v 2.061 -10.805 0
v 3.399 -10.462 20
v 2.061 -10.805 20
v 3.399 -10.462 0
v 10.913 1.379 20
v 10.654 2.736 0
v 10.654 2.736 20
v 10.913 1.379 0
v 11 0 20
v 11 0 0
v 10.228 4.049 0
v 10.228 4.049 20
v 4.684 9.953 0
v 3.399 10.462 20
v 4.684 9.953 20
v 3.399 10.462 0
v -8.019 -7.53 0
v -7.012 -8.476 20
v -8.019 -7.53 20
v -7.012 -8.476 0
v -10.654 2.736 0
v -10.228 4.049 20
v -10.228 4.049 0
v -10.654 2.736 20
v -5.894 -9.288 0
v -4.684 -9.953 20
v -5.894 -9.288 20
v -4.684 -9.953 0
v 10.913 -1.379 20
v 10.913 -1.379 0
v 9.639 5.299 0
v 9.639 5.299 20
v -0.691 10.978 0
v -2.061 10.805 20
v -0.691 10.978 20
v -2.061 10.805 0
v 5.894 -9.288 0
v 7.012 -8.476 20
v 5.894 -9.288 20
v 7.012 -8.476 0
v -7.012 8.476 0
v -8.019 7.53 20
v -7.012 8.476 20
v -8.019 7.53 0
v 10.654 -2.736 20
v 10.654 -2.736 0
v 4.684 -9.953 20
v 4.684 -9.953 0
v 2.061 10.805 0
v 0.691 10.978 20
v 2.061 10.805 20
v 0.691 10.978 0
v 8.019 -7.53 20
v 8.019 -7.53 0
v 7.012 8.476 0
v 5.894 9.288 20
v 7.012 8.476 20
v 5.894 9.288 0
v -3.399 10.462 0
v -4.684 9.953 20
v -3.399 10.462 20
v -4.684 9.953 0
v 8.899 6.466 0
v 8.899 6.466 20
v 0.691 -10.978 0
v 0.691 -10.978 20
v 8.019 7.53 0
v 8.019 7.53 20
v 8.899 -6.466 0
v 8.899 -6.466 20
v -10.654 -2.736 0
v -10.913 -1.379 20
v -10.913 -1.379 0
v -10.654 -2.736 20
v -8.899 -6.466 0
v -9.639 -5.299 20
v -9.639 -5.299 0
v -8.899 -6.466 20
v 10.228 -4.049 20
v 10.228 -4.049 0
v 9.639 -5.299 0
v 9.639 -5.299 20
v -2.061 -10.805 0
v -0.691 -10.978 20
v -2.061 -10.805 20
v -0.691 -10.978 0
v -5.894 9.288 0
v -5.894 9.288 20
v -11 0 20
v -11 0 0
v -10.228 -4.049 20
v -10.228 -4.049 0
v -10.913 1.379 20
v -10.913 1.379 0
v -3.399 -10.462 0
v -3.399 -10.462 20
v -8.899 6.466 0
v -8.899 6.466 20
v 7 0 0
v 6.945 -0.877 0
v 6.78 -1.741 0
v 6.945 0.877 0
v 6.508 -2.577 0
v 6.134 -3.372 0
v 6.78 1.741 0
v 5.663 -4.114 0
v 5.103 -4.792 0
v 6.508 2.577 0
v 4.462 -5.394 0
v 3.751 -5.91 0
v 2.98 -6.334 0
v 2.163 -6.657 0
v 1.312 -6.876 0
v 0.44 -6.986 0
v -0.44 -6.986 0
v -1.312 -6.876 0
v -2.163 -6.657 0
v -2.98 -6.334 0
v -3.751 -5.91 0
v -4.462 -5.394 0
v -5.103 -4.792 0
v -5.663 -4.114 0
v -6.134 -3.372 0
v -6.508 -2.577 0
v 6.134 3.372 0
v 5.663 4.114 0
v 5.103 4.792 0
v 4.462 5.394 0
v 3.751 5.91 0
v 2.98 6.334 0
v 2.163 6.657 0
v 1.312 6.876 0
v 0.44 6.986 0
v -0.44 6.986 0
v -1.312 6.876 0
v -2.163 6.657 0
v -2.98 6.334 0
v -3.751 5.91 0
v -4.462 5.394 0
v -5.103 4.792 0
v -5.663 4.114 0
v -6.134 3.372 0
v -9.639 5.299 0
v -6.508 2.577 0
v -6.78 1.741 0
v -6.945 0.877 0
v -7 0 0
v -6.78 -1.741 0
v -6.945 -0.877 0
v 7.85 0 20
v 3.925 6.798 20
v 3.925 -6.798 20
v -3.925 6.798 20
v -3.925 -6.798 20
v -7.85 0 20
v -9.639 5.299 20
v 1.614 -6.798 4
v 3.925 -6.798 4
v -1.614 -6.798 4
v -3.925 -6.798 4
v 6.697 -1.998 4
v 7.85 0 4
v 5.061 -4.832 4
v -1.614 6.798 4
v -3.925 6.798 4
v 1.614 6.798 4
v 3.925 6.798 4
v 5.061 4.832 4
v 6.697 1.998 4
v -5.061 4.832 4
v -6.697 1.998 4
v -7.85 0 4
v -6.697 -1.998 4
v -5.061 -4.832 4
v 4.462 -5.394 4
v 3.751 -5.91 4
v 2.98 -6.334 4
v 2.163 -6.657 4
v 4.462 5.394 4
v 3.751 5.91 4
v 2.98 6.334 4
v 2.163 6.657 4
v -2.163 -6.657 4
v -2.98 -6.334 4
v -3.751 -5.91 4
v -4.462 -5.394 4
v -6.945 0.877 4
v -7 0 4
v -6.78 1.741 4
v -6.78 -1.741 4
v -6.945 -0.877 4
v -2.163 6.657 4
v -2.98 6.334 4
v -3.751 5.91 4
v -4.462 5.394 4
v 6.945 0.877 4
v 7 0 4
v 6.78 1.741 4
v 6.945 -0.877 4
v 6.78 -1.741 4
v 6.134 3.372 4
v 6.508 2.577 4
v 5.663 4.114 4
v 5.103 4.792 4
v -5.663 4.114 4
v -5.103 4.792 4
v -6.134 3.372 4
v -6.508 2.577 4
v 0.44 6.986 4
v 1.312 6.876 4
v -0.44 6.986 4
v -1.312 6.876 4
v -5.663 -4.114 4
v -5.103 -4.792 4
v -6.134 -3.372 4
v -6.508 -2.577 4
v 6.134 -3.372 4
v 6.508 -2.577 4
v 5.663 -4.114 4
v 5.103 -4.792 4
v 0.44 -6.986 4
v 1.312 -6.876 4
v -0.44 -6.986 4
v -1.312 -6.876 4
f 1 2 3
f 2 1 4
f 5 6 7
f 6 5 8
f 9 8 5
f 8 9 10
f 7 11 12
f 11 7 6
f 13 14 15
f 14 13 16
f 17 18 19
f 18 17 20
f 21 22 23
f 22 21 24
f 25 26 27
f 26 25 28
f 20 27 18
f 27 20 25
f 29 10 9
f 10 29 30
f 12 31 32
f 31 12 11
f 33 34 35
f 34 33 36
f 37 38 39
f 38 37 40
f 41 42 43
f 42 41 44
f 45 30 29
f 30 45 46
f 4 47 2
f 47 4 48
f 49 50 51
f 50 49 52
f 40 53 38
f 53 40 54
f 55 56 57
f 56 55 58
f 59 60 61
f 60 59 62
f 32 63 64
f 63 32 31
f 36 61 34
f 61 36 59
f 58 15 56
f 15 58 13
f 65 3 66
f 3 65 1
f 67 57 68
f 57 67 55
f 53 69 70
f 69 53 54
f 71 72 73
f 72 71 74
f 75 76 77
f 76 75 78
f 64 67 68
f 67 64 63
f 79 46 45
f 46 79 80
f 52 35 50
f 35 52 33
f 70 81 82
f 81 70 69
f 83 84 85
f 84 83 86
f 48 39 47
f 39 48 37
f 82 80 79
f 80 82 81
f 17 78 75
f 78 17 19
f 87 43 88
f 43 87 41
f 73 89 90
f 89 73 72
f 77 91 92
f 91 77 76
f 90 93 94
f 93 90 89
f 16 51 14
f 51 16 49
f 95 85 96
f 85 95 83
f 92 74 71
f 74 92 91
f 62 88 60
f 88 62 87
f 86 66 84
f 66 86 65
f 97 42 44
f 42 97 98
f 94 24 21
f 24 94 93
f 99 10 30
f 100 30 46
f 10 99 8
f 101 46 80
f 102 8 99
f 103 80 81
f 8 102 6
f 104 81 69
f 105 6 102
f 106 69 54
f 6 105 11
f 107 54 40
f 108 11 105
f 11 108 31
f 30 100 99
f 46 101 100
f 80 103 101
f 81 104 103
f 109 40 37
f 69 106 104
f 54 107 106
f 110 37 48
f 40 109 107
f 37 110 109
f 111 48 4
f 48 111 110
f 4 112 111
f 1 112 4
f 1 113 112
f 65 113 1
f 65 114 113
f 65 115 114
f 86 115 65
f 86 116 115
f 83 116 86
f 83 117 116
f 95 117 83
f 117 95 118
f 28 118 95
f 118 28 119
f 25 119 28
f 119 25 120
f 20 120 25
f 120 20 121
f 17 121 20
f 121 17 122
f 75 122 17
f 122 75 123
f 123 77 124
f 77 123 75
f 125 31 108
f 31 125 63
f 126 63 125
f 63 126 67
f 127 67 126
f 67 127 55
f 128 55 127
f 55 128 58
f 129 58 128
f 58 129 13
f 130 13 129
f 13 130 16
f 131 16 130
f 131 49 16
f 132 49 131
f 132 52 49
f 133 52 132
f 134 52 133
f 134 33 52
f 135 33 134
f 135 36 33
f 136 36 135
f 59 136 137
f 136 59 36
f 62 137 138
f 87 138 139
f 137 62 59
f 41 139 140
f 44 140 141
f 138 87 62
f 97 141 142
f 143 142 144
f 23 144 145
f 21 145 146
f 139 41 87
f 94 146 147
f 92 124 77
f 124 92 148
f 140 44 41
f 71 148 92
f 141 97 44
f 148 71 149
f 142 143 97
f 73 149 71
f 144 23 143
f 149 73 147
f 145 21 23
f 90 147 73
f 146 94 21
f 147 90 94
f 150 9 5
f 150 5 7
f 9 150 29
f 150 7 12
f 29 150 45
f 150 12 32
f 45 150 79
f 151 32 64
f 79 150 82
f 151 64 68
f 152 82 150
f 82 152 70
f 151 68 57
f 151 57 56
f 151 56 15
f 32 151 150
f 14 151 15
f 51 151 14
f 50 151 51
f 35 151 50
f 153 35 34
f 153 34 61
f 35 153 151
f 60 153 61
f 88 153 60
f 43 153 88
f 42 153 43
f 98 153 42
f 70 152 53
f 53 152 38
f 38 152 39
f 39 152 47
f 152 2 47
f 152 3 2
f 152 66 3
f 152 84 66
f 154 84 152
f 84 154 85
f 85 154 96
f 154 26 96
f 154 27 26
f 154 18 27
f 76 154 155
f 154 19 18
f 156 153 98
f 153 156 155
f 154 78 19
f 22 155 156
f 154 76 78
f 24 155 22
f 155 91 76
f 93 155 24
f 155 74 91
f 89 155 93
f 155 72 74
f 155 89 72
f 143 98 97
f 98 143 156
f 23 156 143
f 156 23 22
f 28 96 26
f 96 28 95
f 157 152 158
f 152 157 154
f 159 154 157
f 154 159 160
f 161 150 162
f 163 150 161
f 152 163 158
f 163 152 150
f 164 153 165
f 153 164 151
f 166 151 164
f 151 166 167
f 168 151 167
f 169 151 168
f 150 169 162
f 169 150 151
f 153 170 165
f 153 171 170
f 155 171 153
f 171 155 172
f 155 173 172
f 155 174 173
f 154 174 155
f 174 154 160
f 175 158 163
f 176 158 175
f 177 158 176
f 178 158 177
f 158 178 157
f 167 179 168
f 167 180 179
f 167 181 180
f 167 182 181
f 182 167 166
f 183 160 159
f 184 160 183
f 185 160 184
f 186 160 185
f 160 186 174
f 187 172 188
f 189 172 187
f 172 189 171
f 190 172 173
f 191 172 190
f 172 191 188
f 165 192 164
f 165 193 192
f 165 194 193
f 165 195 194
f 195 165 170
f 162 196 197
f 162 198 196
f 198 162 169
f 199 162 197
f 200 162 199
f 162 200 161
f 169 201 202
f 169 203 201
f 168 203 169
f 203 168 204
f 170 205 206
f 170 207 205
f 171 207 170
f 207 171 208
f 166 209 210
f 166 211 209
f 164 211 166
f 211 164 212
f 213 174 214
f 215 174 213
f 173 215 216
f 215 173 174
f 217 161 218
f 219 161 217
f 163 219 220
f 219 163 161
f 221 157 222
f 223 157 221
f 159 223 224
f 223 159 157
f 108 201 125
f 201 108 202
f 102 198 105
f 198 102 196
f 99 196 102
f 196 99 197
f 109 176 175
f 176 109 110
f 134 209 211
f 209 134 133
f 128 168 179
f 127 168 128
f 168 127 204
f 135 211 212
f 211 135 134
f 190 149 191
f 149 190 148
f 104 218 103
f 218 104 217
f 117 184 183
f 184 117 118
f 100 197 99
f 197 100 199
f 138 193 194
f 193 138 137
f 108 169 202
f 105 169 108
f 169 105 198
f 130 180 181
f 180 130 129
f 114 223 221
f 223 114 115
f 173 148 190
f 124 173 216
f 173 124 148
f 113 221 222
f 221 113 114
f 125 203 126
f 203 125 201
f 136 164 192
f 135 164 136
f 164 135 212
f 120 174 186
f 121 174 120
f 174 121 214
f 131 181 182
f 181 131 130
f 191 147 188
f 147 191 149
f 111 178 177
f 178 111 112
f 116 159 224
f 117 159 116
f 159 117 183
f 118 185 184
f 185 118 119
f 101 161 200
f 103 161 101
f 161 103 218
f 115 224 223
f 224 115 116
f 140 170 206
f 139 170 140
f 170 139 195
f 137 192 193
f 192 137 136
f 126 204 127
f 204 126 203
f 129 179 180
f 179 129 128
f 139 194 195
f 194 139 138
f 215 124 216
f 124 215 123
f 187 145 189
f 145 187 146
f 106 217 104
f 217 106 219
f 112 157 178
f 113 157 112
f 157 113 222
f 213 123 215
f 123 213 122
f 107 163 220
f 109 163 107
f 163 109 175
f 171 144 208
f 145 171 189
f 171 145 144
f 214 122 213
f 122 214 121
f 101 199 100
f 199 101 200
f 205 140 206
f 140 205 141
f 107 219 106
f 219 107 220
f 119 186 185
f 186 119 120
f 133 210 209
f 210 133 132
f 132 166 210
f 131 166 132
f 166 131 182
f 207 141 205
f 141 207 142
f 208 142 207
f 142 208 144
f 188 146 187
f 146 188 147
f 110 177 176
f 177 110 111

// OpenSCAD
MAGNET_DIA = 14;
MAGNET_HEIGHT = 4;

HEX_DIA = 15.7;
HEX_HEIGHT = 16;

ADAPTER_DIA = 22;
ADAPTER_HEIGHT = HEX_HEIGHT + MAGNET_HEIGHT;


$fn = 50;

module flex_arm_adapter() {
  difference() {
    cylinder(d = ADAPTER_DIA, h = ADAPTER_HEIGHT);
    translate([0, 0, MAGNET_HEIGHT])
    cylinder(d = HEX_DIA, h = HEX_HEIGHT, $fn = 6);
    cylinder(d = MAGNET_DIA, h = MAGNET_HEIGHT);
  }
}

flex_arm_adapter();
